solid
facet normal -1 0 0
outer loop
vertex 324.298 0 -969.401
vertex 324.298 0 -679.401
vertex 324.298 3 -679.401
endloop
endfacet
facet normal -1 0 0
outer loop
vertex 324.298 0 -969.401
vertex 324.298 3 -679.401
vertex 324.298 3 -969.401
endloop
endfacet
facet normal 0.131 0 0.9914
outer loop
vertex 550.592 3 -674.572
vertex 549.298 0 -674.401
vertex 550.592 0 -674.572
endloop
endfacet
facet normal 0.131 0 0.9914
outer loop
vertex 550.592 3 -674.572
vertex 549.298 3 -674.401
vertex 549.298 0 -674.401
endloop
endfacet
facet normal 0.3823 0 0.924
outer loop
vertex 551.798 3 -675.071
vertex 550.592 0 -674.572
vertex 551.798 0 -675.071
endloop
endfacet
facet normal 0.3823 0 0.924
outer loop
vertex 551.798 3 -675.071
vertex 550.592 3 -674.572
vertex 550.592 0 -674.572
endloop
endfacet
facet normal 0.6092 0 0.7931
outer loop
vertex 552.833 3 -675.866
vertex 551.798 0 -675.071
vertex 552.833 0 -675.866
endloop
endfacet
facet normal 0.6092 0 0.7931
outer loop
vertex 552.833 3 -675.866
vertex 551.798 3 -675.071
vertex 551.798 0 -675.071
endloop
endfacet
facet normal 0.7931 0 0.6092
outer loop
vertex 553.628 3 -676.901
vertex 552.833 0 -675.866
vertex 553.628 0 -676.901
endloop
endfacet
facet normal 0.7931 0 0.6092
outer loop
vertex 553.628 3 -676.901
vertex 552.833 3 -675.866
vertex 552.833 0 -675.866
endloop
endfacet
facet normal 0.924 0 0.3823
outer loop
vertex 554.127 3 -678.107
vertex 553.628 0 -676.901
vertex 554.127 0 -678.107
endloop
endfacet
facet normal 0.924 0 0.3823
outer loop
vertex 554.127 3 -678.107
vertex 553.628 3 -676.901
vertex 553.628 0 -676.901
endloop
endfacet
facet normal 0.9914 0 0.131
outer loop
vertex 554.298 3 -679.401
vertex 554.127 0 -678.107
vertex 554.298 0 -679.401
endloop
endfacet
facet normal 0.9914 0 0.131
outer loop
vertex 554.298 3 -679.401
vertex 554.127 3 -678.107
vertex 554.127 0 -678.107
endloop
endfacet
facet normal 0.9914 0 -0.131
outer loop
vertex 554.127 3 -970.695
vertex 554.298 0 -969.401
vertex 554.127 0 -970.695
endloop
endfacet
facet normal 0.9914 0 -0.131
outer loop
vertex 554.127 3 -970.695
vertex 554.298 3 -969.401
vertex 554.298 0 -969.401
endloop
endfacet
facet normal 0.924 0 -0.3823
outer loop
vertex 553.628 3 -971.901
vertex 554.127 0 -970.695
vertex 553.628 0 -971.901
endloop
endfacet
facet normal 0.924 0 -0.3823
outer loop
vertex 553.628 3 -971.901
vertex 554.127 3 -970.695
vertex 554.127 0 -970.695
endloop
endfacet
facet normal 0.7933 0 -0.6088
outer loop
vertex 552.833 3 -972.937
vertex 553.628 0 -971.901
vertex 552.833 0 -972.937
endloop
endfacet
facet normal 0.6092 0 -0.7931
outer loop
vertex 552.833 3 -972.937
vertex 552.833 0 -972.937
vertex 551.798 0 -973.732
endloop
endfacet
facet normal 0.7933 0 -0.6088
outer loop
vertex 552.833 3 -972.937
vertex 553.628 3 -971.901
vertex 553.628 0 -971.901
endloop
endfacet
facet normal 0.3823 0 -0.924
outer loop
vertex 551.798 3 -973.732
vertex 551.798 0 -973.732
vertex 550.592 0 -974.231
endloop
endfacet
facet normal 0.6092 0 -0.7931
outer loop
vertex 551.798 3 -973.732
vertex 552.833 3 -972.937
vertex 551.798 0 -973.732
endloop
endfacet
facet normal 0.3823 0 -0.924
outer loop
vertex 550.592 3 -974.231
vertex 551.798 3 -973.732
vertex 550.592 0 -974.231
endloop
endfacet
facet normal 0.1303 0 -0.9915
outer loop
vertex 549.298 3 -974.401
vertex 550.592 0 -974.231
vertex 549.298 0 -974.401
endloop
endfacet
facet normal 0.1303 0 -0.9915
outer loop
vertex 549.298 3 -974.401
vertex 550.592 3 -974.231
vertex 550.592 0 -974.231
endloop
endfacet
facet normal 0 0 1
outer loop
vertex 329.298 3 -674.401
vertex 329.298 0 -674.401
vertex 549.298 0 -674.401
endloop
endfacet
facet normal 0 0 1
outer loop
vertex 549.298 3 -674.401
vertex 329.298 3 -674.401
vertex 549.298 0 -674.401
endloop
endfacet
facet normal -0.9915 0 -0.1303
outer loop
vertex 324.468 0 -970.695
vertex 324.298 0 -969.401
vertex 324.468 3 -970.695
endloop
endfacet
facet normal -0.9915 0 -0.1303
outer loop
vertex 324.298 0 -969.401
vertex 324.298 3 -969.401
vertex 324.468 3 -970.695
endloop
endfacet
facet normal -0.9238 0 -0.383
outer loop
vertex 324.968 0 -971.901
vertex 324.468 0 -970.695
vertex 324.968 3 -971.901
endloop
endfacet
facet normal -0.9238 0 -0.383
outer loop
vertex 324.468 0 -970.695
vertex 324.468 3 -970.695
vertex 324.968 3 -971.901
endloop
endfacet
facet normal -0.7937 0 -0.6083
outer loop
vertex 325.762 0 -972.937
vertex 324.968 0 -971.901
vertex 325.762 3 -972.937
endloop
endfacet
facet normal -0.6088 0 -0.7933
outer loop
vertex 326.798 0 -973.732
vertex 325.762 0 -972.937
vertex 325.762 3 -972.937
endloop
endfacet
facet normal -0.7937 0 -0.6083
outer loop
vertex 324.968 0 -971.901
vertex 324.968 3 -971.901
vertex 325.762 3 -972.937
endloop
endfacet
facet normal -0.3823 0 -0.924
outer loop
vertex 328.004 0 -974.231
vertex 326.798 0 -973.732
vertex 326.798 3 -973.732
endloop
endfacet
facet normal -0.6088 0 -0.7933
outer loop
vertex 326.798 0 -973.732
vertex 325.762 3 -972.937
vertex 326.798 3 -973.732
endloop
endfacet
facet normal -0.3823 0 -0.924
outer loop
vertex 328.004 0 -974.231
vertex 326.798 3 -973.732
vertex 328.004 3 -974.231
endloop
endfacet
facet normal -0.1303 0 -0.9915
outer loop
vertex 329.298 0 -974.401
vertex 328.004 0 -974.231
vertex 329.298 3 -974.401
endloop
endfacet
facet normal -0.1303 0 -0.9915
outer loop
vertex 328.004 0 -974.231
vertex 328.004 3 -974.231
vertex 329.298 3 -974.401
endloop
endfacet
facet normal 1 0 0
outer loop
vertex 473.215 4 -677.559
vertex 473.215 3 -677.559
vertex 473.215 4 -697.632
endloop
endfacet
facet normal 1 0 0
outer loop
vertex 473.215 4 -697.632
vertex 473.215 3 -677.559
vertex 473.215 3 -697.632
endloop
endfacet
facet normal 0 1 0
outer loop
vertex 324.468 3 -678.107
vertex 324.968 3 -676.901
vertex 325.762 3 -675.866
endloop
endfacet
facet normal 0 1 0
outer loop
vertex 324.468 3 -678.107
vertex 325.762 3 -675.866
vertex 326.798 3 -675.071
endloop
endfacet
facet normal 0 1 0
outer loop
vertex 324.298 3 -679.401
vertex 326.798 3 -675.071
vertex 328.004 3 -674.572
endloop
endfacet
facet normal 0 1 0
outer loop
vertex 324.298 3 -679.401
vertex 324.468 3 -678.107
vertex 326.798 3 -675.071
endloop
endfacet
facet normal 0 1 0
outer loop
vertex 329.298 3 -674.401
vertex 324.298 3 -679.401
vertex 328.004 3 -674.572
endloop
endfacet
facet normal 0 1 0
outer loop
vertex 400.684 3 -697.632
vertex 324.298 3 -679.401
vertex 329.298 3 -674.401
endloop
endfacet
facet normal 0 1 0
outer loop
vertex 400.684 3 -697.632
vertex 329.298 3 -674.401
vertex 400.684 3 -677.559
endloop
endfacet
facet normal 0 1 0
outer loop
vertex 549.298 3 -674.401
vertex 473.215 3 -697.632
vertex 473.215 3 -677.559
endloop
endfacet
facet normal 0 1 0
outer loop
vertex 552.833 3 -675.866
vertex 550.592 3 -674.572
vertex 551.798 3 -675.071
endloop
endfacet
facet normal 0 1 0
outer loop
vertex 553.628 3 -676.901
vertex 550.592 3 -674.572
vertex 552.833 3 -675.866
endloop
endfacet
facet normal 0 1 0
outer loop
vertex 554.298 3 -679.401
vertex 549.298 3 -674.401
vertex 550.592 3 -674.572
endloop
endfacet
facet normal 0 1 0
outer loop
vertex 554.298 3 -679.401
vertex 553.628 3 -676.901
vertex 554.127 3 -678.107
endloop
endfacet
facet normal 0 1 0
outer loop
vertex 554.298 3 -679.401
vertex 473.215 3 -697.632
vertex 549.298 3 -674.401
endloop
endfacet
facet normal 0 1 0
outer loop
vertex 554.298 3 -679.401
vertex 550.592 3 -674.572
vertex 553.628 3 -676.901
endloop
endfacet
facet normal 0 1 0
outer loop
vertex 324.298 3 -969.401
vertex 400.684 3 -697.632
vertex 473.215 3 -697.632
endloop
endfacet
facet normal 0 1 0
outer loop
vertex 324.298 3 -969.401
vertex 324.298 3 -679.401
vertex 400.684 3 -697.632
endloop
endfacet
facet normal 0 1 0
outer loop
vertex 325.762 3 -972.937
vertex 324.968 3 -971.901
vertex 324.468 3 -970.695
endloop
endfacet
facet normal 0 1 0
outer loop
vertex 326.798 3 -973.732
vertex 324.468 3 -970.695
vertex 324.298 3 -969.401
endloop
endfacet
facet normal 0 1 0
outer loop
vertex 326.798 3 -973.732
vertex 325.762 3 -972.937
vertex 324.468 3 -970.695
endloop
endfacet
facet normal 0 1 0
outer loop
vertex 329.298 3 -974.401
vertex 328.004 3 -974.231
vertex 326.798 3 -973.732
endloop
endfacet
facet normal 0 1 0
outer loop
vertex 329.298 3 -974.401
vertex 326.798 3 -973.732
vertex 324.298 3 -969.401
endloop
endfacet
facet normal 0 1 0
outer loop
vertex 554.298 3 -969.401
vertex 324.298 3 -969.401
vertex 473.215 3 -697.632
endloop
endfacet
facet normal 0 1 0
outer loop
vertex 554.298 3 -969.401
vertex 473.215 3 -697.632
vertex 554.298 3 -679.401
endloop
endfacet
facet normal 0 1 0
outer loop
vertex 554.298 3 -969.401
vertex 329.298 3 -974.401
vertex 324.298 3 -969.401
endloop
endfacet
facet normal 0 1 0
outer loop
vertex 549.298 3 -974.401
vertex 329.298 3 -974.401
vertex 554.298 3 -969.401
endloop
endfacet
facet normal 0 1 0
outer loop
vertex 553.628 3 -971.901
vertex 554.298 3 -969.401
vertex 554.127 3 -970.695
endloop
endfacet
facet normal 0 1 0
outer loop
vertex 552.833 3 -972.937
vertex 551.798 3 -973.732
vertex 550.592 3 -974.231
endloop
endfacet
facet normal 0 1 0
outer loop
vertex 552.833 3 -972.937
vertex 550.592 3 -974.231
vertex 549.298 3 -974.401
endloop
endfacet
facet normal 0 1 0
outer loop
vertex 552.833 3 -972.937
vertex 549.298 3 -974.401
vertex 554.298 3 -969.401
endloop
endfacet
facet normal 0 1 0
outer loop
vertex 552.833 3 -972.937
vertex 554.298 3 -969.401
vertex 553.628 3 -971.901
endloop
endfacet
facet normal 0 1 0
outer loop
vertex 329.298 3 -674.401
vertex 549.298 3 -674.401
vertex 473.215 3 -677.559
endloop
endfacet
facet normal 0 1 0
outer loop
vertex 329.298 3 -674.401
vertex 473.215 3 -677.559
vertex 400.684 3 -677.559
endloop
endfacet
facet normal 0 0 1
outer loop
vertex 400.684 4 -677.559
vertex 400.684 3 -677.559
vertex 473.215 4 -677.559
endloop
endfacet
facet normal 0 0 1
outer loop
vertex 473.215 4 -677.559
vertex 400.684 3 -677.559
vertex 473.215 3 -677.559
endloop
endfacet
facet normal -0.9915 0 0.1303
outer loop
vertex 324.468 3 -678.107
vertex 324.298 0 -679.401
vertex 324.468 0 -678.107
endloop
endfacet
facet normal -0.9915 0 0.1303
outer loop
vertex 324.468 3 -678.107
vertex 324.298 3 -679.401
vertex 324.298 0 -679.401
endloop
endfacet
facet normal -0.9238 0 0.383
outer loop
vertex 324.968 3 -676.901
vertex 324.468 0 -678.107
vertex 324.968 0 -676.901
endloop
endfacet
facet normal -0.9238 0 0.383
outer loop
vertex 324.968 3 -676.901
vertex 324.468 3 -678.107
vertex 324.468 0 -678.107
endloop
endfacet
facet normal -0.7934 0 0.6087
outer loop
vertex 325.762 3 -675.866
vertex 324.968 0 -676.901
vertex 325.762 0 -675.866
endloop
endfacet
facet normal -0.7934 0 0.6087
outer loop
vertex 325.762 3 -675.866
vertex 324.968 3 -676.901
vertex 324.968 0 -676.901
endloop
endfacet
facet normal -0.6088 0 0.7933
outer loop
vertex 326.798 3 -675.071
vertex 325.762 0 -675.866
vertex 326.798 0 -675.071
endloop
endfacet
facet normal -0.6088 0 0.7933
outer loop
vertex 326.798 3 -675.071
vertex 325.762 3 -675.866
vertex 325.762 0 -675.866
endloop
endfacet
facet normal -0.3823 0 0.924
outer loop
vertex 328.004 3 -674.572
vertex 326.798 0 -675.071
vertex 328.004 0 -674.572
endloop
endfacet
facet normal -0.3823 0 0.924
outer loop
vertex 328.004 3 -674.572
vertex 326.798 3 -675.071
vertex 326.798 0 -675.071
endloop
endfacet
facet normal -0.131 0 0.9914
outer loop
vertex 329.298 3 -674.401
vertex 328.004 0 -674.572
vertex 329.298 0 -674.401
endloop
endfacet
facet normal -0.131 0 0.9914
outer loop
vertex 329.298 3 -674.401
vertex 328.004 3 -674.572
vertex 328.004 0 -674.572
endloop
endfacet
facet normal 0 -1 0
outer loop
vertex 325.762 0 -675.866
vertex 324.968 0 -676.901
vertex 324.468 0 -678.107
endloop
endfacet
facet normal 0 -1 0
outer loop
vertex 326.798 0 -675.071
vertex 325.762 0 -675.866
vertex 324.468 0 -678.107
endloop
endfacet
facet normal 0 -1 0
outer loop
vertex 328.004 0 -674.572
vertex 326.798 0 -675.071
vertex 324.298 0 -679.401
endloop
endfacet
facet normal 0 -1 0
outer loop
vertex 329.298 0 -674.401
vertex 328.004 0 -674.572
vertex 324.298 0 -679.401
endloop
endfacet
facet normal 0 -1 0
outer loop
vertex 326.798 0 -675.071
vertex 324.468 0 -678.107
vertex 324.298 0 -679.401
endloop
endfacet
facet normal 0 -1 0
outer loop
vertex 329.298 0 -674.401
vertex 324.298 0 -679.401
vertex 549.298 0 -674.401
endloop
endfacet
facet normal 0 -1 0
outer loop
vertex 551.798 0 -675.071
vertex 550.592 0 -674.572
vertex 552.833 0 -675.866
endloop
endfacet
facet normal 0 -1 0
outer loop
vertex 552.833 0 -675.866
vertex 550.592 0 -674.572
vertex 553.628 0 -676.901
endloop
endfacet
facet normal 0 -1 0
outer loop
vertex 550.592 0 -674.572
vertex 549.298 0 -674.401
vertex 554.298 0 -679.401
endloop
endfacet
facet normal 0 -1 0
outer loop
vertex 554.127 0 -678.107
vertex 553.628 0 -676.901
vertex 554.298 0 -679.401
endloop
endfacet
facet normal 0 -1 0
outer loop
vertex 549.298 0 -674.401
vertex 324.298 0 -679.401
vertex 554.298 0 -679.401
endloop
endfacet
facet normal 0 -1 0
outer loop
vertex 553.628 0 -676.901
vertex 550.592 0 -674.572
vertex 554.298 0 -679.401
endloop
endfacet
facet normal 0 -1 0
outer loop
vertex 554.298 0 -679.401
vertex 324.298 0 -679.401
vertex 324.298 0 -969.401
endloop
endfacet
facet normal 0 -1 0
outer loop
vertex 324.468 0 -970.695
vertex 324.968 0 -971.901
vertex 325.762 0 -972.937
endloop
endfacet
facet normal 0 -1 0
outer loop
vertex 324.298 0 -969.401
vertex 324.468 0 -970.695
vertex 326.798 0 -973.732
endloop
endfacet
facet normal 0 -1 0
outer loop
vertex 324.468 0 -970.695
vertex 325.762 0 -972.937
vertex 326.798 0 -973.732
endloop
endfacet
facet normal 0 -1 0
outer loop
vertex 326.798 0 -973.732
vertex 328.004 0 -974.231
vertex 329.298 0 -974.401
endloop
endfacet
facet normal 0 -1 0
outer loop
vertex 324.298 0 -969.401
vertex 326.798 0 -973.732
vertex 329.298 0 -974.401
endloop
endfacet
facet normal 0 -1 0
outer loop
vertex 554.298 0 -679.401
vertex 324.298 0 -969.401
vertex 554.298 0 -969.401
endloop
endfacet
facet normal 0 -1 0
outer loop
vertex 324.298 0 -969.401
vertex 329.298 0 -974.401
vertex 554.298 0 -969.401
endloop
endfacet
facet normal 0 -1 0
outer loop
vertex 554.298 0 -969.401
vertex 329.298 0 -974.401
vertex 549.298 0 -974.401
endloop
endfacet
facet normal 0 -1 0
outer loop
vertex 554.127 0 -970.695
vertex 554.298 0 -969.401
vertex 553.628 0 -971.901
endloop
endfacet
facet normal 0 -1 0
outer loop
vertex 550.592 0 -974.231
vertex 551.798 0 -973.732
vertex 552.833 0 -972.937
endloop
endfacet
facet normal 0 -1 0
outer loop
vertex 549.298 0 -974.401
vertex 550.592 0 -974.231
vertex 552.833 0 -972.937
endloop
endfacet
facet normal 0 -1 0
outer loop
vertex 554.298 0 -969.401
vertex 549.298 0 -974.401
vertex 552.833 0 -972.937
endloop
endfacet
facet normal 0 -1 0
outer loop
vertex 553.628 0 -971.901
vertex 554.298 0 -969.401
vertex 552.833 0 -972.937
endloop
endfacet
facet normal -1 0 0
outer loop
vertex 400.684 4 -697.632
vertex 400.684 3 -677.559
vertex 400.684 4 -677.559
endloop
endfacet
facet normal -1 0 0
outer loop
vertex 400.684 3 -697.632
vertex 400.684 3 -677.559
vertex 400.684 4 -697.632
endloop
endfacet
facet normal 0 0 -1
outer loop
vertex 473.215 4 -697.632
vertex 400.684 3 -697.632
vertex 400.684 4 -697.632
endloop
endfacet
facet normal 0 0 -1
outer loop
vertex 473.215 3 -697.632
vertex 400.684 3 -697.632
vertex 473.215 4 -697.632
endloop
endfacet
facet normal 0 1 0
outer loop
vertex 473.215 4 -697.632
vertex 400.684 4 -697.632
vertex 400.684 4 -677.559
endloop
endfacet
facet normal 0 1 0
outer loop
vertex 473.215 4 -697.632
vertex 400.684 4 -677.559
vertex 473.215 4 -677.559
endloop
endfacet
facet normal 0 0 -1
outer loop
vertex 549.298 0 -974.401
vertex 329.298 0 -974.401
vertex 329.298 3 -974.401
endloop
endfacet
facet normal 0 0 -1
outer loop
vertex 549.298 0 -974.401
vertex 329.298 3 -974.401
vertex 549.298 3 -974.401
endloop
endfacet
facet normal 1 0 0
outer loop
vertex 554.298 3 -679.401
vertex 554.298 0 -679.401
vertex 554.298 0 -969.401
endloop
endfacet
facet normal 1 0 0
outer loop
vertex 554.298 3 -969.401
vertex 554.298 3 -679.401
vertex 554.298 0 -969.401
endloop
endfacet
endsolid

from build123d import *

# Parameters (mm, degrees)
SKETCH1_W           = 230
SKETCH1_H           = 300
BOSS_EXTRUDE1_DEPTH = 3
FILLET1_R           = 5
SKETCH2_W           = 72.53015036
SKETCH2_H           = 20.073618637
BOSS_EXTRUDE2_DEPTH = 1


with BuildPart() as part:
    # Sketch1 → Boss-Extrude1 (new body)
    with BuildSketch(Plane(origin=(0, 0, 0), x_dir=(1, 0, 0), z_dir=(0, 1, 0))):
        with Locations((439.297793407, 824.401400972)):
            Rectangle(SKETCH1_W, SKETCH1_H)
    extrude(amount=BOSS_EXTRUDE1_DEPTH)

    # Fillet1
    fillet1_edges = [part.edges().sort_by_distance(p)[0] for p in [
        (554.297793407, 1.5, -674.401400972),
        (324.297793407, 1.5, -674.401400972),
        (324.297793407, 1.5, -974.401400972),
        (554.297793407, 1.5, -974.401400972),
    ]]
    fillet(fillet1_edges, radius=FILLET1_R)

    # Sketch2 → Boss-Extrude2 (add)
    with BuildSketch(Plane(origin=(0, 3, 0), x_dir=(1, 0, 0), z_dir=(0, 1, 0))):
        with Locations((436.94953533, 687.595411645)):
            Rectangle(SKETCH2_W, SKETCH2_H)
    extrude(amount=BOSS_EXTRUDE2_DEPTH)


solid = part.part
